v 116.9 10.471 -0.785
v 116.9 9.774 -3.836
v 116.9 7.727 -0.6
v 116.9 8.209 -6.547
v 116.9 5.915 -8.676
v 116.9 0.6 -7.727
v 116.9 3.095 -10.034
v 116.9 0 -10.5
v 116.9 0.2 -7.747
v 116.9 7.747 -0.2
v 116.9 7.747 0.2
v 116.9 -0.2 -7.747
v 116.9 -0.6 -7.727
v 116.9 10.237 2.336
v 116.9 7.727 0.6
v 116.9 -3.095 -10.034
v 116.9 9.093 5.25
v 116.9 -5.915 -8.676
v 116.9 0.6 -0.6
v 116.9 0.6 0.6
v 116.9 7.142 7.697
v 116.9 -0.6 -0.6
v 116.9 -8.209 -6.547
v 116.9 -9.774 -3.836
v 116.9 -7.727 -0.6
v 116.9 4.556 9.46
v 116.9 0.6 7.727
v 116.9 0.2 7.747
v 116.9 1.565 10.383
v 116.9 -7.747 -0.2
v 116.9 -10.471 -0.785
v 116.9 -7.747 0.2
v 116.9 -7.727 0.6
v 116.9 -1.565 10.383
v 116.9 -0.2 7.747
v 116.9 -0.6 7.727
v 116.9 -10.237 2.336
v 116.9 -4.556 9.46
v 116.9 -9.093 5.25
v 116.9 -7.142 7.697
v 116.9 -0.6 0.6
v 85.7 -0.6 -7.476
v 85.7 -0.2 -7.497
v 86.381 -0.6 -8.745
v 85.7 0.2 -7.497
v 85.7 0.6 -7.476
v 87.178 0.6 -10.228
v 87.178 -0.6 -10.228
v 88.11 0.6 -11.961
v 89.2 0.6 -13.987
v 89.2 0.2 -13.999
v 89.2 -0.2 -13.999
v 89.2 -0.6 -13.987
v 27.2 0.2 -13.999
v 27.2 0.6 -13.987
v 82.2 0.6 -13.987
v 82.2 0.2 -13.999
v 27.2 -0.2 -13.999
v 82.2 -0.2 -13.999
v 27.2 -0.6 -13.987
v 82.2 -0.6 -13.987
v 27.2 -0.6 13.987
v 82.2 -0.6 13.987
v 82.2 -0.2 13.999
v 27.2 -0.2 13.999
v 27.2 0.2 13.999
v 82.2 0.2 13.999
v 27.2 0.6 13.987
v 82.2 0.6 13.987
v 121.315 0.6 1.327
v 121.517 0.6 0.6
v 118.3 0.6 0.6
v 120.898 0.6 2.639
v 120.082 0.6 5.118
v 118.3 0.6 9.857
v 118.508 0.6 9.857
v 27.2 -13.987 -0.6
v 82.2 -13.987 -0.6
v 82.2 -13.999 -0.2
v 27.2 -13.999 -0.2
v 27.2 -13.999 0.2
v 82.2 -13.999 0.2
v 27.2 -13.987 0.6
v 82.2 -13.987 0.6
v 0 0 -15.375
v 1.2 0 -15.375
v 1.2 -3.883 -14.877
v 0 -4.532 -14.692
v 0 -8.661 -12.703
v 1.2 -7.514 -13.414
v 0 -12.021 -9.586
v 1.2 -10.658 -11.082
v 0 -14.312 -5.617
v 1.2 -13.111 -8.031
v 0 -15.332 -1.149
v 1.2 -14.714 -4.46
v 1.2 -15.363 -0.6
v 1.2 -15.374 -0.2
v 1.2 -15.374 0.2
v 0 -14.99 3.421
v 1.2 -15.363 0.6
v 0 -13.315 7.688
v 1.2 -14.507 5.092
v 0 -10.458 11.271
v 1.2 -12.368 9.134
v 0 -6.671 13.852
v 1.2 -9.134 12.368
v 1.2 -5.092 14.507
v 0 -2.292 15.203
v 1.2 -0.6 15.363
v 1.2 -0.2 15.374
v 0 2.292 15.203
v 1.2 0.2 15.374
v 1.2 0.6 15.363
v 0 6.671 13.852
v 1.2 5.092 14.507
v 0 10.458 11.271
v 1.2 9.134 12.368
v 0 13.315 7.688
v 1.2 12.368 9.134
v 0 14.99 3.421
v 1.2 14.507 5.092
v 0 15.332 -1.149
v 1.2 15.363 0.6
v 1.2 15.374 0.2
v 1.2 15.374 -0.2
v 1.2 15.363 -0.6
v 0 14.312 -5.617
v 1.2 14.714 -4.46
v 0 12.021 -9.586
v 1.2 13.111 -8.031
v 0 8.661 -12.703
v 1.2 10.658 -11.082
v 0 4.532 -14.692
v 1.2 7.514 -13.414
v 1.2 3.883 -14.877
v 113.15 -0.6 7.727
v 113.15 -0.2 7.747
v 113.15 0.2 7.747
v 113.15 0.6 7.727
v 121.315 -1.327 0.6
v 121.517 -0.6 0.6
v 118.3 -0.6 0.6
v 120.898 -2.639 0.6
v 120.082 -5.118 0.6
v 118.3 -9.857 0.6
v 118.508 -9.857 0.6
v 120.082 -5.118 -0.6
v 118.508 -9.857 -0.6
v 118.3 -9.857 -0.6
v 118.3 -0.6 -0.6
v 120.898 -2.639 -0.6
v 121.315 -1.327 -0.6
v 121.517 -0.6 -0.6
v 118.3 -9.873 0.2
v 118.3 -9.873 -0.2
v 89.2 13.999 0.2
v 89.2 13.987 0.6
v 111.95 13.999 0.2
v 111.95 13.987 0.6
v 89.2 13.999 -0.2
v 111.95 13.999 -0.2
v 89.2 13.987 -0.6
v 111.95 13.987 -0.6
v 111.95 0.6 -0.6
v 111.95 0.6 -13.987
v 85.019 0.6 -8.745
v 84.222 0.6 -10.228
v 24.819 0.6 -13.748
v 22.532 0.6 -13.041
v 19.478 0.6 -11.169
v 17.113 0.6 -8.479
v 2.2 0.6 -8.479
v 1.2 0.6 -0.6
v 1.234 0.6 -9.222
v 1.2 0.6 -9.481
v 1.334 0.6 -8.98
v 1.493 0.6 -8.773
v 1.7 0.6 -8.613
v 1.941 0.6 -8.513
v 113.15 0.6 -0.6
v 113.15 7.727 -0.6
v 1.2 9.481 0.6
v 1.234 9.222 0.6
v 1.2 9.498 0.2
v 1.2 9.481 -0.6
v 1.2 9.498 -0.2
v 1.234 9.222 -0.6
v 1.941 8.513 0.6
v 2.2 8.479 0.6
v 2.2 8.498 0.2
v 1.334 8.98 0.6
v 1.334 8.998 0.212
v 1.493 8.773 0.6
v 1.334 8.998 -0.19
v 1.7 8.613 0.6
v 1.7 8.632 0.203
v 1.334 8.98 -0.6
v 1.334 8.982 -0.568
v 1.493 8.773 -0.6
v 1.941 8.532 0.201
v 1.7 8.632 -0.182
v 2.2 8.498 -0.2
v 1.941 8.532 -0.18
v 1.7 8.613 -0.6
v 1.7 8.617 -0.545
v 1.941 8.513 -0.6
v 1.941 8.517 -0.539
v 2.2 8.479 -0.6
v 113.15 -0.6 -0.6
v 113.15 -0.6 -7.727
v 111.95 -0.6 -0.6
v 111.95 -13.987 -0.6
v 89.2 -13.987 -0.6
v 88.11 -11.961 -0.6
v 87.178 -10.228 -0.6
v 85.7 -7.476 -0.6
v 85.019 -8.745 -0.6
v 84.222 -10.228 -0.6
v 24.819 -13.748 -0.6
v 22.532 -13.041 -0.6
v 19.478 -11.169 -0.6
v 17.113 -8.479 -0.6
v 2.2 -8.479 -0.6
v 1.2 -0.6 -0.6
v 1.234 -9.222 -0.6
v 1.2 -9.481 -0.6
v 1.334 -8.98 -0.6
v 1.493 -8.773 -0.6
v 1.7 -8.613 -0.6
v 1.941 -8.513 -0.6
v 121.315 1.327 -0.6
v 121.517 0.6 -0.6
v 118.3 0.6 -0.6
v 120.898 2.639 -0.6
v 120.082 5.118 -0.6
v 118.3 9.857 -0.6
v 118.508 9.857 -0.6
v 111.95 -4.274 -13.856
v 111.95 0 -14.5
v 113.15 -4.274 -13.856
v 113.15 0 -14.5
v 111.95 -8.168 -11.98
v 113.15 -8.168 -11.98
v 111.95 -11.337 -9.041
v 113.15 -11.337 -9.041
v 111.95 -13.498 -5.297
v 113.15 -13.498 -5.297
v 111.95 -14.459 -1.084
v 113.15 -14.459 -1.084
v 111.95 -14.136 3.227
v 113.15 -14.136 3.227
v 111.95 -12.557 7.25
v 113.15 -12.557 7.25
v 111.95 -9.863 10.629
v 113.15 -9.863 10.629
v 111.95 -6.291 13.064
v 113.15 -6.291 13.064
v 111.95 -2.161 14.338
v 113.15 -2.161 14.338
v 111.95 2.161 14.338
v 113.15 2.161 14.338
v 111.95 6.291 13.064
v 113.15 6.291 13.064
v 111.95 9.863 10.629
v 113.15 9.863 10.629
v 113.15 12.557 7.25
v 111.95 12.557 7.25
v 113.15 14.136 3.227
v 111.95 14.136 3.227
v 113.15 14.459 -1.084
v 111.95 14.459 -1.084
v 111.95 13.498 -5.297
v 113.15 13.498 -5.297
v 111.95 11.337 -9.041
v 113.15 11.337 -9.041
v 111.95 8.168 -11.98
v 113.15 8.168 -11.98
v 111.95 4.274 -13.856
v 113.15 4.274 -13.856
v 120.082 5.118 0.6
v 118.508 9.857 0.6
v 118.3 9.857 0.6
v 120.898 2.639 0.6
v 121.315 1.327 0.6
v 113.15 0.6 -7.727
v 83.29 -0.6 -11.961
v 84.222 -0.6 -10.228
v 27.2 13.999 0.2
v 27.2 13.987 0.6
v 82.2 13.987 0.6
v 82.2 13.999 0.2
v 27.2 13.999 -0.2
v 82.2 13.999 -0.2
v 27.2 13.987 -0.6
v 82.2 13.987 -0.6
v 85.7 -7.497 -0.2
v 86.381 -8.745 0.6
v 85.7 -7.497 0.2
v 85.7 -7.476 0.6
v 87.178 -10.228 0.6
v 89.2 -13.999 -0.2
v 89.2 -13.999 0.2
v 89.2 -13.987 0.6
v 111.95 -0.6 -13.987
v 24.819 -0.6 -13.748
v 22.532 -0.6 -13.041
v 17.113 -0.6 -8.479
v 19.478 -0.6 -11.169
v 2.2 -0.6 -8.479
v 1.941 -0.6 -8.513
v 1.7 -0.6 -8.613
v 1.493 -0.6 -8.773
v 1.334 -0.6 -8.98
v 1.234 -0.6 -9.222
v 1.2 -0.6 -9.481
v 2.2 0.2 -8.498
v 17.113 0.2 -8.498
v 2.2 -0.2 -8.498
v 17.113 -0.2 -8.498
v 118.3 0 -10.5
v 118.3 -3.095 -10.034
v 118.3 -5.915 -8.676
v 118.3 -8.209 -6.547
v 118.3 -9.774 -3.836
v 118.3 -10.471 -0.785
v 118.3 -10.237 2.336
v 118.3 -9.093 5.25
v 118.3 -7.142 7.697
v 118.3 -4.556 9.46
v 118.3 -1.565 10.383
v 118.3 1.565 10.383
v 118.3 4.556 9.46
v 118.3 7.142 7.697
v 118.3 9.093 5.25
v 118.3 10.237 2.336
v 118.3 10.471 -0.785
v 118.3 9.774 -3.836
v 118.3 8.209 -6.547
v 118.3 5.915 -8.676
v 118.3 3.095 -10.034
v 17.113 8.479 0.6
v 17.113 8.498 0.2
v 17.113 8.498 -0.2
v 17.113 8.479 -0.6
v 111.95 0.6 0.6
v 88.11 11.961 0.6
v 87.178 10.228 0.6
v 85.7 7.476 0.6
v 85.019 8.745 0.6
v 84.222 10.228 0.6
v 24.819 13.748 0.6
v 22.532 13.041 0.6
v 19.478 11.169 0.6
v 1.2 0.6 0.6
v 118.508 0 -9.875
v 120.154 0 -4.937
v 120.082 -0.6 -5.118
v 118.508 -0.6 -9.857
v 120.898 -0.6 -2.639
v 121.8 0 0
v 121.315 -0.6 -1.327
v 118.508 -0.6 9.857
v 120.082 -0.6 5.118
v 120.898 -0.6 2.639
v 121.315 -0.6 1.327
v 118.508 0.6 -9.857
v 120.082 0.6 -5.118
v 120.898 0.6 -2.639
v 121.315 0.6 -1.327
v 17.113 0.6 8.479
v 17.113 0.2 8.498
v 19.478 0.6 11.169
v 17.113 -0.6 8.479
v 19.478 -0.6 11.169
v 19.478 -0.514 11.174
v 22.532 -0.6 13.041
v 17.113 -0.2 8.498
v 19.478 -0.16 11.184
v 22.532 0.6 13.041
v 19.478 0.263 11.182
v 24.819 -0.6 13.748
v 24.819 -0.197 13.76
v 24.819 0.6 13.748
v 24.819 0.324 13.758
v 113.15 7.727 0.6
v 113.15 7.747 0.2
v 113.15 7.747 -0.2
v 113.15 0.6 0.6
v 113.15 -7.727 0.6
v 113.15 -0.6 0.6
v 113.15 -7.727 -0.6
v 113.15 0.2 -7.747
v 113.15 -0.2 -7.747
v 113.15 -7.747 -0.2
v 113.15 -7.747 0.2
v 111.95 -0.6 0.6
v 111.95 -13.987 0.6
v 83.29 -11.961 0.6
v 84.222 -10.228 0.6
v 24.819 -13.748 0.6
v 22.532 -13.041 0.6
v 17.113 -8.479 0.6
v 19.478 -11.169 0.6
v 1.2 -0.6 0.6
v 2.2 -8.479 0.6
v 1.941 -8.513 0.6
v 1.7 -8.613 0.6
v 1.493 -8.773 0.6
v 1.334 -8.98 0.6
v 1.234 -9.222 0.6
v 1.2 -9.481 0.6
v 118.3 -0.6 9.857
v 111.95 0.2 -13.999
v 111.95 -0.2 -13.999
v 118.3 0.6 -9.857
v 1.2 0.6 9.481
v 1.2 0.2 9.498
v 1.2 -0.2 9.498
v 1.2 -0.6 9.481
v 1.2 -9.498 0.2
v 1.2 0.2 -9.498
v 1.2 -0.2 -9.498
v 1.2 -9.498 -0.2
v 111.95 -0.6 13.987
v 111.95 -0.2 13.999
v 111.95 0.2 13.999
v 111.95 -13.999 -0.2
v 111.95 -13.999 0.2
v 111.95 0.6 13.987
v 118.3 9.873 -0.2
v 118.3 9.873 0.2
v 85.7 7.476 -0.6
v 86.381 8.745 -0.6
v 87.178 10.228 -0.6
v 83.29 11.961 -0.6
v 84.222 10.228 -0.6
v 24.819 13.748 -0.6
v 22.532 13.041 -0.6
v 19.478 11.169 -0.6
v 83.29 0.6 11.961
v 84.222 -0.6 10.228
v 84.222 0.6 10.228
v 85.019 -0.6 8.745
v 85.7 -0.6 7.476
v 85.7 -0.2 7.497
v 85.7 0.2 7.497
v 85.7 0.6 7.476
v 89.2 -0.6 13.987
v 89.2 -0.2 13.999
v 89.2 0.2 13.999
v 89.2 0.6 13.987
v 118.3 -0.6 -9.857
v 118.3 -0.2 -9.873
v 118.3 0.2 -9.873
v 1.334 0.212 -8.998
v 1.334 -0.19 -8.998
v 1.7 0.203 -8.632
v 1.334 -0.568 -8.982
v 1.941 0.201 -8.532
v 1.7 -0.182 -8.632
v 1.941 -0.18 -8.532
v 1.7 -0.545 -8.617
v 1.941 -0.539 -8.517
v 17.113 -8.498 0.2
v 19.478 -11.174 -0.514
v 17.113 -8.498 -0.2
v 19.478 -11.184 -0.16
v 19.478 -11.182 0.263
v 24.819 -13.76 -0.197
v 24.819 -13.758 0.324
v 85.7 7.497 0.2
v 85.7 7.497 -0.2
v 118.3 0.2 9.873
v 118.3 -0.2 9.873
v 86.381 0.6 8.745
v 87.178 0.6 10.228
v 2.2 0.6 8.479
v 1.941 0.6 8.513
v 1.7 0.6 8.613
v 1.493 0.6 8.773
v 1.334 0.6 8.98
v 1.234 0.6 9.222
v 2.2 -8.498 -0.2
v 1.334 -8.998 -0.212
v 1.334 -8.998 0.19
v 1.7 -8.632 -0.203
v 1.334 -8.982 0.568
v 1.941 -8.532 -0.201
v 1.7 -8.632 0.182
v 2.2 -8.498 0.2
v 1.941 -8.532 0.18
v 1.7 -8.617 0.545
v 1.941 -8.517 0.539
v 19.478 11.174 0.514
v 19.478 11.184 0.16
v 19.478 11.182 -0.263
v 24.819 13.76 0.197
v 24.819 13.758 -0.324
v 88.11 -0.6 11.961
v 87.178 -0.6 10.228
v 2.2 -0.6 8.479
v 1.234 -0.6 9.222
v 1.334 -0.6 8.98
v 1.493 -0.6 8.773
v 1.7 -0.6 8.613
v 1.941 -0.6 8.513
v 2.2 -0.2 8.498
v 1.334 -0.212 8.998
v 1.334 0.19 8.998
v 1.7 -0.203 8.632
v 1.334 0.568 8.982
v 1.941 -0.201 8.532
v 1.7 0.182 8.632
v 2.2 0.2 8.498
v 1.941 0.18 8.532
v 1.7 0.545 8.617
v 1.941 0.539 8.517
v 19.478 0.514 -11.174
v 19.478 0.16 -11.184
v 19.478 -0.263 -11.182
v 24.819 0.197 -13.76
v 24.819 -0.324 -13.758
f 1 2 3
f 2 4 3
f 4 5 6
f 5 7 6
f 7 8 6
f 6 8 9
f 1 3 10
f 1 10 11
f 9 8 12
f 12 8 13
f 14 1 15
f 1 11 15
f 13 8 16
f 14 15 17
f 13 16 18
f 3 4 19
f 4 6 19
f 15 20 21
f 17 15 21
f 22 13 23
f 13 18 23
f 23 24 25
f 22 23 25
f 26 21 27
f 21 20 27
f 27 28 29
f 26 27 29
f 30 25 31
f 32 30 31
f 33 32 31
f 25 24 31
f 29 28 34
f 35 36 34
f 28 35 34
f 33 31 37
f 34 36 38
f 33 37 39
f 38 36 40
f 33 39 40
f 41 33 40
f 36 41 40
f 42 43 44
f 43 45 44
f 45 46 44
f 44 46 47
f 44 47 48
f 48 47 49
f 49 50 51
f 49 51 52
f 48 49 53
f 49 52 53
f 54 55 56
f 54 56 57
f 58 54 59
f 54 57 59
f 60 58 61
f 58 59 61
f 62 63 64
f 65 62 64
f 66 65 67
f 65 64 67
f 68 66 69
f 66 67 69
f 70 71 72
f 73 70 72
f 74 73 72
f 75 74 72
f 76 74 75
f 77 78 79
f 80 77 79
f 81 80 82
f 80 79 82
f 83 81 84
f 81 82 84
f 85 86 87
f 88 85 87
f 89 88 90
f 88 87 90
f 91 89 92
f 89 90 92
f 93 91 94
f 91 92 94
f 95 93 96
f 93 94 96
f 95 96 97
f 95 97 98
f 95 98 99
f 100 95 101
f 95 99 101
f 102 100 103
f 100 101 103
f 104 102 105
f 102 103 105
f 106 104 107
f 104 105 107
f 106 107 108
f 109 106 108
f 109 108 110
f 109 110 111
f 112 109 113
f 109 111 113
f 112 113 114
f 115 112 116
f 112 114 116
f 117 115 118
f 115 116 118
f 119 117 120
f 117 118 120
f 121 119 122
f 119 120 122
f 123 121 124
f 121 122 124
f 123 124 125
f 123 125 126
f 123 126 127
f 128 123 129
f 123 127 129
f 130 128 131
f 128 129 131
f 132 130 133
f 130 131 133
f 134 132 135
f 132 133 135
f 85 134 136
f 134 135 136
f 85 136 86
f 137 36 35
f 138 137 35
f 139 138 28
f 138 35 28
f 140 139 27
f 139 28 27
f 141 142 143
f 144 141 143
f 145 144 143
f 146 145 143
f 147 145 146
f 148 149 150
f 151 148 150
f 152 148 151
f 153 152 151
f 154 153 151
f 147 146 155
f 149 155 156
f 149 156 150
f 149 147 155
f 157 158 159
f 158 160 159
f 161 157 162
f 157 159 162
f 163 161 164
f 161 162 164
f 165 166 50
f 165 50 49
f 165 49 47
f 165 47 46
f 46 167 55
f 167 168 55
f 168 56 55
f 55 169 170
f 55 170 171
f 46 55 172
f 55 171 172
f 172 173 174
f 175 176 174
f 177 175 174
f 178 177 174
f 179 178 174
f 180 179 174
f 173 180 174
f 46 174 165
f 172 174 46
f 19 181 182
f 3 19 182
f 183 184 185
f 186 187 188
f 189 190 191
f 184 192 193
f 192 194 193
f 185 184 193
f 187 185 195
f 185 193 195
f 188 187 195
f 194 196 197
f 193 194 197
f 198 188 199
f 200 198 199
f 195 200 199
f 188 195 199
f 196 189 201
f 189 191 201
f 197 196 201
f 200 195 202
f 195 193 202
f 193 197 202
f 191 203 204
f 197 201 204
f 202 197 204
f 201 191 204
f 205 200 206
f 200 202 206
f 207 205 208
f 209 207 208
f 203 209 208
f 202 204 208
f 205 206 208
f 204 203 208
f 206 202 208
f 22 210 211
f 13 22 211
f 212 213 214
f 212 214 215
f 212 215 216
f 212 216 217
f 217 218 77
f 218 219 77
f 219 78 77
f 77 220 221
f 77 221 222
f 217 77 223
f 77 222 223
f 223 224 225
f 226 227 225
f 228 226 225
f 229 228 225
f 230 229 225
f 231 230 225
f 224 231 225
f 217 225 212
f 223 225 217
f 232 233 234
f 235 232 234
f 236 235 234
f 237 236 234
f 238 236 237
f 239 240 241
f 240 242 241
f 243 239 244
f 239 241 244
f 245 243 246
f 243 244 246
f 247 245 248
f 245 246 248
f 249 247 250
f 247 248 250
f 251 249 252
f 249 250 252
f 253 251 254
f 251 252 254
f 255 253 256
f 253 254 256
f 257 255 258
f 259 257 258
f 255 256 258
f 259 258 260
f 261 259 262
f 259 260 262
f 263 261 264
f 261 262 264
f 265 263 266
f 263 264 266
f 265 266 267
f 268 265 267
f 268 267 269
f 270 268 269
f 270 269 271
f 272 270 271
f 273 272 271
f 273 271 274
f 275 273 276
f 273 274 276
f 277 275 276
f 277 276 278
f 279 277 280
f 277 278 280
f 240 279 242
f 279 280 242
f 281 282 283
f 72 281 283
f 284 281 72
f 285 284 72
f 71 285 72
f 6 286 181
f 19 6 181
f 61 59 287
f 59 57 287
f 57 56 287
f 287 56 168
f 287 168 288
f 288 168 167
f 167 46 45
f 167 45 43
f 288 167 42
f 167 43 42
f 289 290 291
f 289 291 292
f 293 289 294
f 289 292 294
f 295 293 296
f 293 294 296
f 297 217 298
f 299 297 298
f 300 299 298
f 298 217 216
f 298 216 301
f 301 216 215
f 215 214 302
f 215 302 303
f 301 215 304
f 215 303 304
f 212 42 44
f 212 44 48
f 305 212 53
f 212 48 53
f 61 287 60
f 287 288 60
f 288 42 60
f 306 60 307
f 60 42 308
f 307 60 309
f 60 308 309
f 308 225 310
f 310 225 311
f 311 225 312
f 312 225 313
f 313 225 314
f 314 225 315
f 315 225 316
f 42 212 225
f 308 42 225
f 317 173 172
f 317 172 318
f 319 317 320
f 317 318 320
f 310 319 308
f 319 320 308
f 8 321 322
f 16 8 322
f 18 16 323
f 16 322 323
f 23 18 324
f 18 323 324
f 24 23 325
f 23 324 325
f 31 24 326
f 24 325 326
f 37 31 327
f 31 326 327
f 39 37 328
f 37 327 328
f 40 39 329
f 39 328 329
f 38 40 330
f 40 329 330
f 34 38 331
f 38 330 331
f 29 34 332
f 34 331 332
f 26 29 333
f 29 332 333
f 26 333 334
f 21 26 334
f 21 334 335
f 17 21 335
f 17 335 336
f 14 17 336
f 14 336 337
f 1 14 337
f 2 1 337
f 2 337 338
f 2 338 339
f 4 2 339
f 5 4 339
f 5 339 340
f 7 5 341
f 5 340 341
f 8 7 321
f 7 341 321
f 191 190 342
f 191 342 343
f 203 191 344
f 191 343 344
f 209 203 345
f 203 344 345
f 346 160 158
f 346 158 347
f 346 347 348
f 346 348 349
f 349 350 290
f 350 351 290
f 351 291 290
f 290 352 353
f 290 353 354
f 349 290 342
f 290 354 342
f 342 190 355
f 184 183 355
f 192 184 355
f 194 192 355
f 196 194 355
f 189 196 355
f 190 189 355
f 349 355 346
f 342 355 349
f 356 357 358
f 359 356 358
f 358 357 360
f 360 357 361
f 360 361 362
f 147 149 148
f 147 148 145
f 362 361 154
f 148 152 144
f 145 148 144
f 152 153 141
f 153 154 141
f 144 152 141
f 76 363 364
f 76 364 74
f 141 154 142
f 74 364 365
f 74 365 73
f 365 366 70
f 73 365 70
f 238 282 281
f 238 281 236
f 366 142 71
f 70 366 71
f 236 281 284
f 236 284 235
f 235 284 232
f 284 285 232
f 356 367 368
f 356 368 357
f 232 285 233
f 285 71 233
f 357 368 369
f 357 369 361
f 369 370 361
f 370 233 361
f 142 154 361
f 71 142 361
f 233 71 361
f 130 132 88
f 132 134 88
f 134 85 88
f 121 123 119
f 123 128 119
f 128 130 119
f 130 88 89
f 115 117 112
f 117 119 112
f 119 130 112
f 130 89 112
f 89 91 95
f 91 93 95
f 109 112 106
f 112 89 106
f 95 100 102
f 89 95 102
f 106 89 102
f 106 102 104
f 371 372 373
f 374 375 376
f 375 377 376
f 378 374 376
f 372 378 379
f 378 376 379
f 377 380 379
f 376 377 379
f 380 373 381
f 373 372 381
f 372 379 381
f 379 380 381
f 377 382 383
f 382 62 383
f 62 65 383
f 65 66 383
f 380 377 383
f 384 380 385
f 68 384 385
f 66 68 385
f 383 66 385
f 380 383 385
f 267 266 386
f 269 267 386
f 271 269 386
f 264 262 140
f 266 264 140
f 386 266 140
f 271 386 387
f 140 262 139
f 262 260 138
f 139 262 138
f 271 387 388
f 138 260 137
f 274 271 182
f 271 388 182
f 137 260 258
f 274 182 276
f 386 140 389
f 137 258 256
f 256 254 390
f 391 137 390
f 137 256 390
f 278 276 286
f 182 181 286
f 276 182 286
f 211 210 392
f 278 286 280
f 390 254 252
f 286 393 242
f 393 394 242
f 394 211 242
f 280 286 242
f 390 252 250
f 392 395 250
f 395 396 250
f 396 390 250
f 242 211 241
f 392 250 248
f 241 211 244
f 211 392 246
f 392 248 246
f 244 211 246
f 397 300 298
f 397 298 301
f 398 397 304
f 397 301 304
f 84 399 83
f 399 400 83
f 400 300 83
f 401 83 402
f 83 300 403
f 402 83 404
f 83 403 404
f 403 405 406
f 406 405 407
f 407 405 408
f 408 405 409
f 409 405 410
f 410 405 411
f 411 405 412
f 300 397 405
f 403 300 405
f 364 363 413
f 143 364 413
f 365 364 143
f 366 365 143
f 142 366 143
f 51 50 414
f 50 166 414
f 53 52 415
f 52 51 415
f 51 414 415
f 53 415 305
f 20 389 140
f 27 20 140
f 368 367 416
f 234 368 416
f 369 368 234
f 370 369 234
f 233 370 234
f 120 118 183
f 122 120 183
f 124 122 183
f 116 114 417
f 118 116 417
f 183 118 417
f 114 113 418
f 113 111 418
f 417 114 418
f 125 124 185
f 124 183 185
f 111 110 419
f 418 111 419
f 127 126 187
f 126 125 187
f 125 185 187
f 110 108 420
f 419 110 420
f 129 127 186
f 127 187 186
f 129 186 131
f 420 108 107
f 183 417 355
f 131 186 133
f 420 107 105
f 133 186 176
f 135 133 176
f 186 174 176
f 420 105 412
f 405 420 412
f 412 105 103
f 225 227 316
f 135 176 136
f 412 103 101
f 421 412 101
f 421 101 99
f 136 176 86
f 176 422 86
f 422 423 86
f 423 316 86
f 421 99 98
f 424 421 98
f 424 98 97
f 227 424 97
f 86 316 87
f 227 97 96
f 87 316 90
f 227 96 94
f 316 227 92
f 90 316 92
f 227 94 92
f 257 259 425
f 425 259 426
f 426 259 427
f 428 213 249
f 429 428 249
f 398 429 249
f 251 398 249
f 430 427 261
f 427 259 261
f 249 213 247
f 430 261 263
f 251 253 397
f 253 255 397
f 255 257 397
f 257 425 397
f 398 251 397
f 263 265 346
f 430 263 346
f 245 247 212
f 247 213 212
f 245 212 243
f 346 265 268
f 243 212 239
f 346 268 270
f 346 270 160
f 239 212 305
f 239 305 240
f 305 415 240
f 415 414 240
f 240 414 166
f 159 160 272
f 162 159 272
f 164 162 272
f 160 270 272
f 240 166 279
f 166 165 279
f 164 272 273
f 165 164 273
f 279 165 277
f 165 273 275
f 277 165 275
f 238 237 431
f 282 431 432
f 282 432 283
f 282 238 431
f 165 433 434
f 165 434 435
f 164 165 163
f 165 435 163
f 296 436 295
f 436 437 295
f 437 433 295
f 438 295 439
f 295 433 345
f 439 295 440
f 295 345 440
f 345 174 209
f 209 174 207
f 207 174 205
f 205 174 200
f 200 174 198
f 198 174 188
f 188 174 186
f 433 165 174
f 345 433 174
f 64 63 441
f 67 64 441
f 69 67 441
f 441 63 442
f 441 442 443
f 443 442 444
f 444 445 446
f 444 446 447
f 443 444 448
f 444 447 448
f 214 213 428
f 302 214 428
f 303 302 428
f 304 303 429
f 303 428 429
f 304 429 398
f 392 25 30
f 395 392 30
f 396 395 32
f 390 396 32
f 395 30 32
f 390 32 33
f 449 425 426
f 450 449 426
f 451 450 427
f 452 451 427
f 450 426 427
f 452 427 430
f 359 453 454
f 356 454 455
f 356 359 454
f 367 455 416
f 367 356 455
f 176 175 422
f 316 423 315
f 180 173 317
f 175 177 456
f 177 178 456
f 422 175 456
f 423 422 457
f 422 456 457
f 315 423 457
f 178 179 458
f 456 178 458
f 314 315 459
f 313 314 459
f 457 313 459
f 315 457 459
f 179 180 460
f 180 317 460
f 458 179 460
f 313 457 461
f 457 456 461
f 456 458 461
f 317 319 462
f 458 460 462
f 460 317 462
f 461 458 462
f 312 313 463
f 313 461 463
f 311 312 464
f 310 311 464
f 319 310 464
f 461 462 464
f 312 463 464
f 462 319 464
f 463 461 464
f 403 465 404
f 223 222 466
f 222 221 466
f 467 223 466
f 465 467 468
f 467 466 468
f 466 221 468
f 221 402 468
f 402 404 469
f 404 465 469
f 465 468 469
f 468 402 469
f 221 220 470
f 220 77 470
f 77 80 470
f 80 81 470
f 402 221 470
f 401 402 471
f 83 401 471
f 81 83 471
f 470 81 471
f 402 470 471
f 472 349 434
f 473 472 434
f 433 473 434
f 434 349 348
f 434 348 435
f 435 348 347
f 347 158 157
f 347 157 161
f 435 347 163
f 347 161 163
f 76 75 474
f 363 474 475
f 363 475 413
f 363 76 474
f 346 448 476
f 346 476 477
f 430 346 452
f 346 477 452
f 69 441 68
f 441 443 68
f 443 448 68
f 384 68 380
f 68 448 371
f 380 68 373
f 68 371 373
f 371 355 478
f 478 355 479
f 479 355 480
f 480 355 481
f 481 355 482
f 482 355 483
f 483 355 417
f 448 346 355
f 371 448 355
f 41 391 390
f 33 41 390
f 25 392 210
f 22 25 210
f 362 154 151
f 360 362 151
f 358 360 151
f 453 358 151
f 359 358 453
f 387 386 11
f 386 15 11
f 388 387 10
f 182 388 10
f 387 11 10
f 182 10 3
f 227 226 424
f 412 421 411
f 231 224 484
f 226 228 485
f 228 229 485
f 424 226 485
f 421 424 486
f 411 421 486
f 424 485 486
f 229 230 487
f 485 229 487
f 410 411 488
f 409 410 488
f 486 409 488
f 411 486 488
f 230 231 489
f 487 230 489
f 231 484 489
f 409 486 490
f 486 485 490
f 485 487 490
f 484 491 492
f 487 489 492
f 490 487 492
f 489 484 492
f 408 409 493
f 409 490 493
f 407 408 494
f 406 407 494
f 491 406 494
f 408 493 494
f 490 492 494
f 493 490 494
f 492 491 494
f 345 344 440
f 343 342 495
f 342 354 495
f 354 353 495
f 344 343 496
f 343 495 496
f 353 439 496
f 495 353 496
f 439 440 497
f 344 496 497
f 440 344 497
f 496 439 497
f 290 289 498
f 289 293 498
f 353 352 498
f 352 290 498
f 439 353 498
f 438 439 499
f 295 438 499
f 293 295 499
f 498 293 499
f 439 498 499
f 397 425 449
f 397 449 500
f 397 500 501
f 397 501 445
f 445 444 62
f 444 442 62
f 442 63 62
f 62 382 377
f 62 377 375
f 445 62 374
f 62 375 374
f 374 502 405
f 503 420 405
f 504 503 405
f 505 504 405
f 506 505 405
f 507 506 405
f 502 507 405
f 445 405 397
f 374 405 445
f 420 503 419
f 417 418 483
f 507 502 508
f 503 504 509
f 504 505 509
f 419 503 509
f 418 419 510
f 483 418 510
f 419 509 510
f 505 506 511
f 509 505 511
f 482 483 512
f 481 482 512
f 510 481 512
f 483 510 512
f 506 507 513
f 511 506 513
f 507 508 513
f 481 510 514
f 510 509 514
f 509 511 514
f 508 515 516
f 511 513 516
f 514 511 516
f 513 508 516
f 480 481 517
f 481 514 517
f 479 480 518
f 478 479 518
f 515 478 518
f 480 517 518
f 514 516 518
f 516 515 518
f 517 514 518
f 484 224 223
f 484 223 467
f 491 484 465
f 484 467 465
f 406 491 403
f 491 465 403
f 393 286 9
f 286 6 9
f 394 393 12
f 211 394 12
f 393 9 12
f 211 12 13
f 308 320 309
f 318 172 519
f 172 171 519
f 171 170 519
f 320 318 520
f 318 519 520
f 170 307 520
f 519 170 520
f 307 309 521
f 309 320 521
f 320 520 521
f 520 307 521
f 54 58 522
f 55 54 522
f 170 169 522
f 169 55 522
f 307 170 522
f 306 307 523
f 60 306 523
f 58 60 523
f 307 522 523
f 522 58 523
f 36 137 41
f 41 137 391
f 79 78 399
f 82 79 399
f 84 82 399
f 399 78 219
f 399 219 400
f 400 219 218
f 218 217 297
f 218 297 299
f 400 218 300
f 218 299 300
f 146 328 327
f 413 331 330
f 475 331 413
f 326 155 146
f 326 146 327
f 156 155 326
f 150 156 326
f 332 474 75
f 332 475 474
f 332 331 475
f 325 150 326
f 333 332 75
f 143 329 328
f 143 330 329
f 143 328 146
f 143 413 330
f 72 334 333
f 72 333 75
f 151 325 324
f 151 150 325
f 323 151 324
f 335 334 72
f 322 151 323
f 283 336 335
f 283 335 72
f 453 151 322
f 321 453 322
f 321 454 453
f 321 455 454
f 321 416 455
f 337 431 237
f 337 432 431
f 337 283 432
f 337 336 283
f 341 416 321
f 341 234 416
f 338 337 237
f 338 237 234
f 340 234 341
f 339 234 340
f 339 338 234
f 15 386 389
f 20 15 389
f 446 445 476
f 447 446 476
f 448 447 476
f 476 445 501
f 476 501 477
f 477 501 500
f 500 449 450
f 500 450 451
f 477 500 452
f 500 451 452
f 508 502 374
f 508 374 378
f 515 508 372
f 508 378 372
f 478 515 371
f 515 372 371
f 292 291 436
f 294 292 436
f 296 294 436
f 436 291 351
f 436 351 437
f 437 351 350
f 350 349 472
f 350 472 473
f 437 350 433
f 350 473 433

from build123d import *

# Parameters (mm, degrees)
SKETCH2_OUTSIDE_W  = 58.616
SKETCH2_OUTSIDE_H  = 58.616
CUT_EXTRUDE1_DEPTH = 110.75
SKETCH4_OUTSIDE_W  = 58.616
SKETCH4_OUTSIDE_H  = 58.616
CUT_EXTRUDE3_DEPTH = 3.75
SKETCH5_OUTSIDE_W  = 58.616
SKETCH5_OUTSIDE_H  = 58.616
CUT_EXTRUDE4_DEPTH = 3.5


with BuildPart() as part:
    # Sketch1 → Revolve1 (revolve)
    with BuildSketch(Plane.XY, mode=Mode.PRIVATE) as revolve1_sk:
        with BuildLine():
            Line((0, 0), (0, 15.375))
            Line((0, 15.375), (1.2, 15.375))
            Line((1.2, 15.375), (1.2, 9.5))
            ThreePointArc((1.2, 9.5), (1.492893219, 8.792893219), (2.2, 8.5))
            Line((2.2, 8.5), (17.112879499, 8.5))
            ThreePointArc((17.112879499, 8.5), (21.455437353, 12.535653753), (27.2, 14))
            Line((27.2, 14), (82.2, 14))
            Line((82.2, 14), (85.7, 7.5))
            Line((85.7, 7.5), (89.2, 14))
            Line((89.2, 14), (111.95, 14))
            Line((111.95, 14), (111.95, 14.5))
            Line((111.95, 14.5), (113.15, 14.5))
            Line((113.15, 14.5), (113.15, 7.75))
            Line((113.15, 7.75), (116.9, 7.75))
            Line((116.9, 7.75), (116.9, 10.5))
            Line((116.9, 10.5), (118.3, 10.5))
            Line((118.3, 10.5), (121.8, 0))
            Line((121.8, 0), (0, 0))
        make_face()
    revolve(revolve1_sk.sketch.rotate(Axis((121.8, 0, 0), (-1, 0, 0)), 90), axis=Axis((121.8, 0, 0), (-1, 0, 0)))

    # Sketch2 outside → Cut-Extrude1 (cut)
    with BuildSketch(Plane(origin=(1.2, 0, 0), x_dir=(0, 0, -1), z_dir=(1, 0, 0))):
        Rectangle(SKETCH2_OUTSIDE_W, SKETCH2_OUTSIDE_H)
        with BuildLine():
            Line((-0.6, 15.363288222), (-0.6, 0.6))
            Line((-0.6, 0.6), (-15.363288222, 0.6))
            ThreePointArc((-15.363288222, 0.6), (-15.375, 0), (-15.363288222, -0.6))
            Line((-15.363288222, -0.6), (-0.6, -0.6))
            Line((-0.6, -0.6), (-0.6, -15.363288222))
            ThreePointArc((-0.6, -15.363288222), (0, -15.375), (0.6, -15.363288222))
            Line((0.6, -15.363288222), (0.6, -0.6))
            Line((0.6, -0.6), (15.363288222, -0.6))
            ThreePointArc((15.363288222, -0.6), (15.375, 0), (15.363288222, 0.6))
            Line((15.363288222, 0.6), (0.6, 0.6))
            Line((0.6, 0.6), (0.6, 15.363288222))
            ThreePointArc((0.6, 15.363288222), (0, 15.375), (-0.6, 15.363288222))
        make_face(mode=Mode.SUBTRACT)
    extrude(amount=CUT_EXTRUDE1_DEPTH, mode=Mode.SUBTRACT)

    # Sketch4 outside → Cut-Extrude3 (cut)
    with BuildSketch(Plane(origin=(113.15, 0, 0), x_dir=(0, 0, -1), z_dir=(1, 0, 0))):
        Rectangle(SKETCH4_OUTSIDE_W, SKETCH4_OUTSIDE_H)
        with BuildLine():
            Line((0.6, 0.6), (0.6, 15.363288222))
            ThreePointArc((0.6, 15.363288222), (0, 15.375), (-0.6, 15.363288222))
            Line((-0.6, 15.363288222), (-0.6, 0.6))
            Line((-0.6, 0.6), (-15.363288222, 0.6))
            ThreePointArc((-15.363288222, 0.6), (-15.375, 0), (-15.363288222, -0.6))
            Line((-15.363288222, -0.6), (-0.6, -0.6))
            Line((-0.6, -0.6), (-0.6, -15.363288222))
            ThreePointArc((-0.6, -15.363288222), (0, -15.375), (0.6, -15.363288222))
            Line((0.6, -15.363288222), (0.6, -0.6))
            Line((0.6, -0.6), (15.363288222, -0.6))
            ThreePointArc((15.363288222, -0.6), (15.375, 0), (15.363288222, 0.6))
            Line((15.363288222, 0.6), (0.6, 0.6))
        make_face(mode=Mode.SUBTRACT)
    extrude(amount=CUT_EXTRUDE3_DEPTH, mode=Mode.SUBTRACT)

    # Sketch5 outside → Cut-Extrude4 (cut)
    with BuildSketch(Plane(origin=(121.8, 0, 0), x_dir=(0, 0, -1), z_dir=(1, 0, 0))):
        Rectangle(SKETCH5_OUTSIDE_W, SKETCH5_OUTSIDE_H)
        with BuildLine():
            Line((0.6, 0.6), (0.6, 9.856755298))
            ThreePointArc((0.6, 9.856755298), (0, 9.875), (-0.6, 9.856755298))
            Line((-0.6, 9.856755298), (-0.6, 0.6))
            Line((-0.6, 0.6), (-9.856755298, 0.6))
            ThreePointArc((-9.856755298, 0.6), (-9.875, 0), (-9.856755298, -0.6))
            Line((-9.856755298, -0.6), (-0.6, -0.6))
            Line((-0.6, -0.6), (-0.6, -9.856755298))
            ThreePointArc((-0.6, -9.856755298), (0, -9.875), (0.6, -9.856755298))
            Line((0.6, -9.856755298), (0.6, -0.6))
            Line((0.6, -0.6), (9.856755298, -0.6))
            ThreePointArc((9.856755298, -0.6), (9.875, 0), (9.856755298, 0.6))
            Line((9.856755298, 0.6), (0.6, 0.6))
        make_face(mode=Mode.SUBTRACT)
    extrude(amount=-CUT_EXTRUDE4_DEPTH, mode=Mode.SUBTRACT)


solid = part.part
